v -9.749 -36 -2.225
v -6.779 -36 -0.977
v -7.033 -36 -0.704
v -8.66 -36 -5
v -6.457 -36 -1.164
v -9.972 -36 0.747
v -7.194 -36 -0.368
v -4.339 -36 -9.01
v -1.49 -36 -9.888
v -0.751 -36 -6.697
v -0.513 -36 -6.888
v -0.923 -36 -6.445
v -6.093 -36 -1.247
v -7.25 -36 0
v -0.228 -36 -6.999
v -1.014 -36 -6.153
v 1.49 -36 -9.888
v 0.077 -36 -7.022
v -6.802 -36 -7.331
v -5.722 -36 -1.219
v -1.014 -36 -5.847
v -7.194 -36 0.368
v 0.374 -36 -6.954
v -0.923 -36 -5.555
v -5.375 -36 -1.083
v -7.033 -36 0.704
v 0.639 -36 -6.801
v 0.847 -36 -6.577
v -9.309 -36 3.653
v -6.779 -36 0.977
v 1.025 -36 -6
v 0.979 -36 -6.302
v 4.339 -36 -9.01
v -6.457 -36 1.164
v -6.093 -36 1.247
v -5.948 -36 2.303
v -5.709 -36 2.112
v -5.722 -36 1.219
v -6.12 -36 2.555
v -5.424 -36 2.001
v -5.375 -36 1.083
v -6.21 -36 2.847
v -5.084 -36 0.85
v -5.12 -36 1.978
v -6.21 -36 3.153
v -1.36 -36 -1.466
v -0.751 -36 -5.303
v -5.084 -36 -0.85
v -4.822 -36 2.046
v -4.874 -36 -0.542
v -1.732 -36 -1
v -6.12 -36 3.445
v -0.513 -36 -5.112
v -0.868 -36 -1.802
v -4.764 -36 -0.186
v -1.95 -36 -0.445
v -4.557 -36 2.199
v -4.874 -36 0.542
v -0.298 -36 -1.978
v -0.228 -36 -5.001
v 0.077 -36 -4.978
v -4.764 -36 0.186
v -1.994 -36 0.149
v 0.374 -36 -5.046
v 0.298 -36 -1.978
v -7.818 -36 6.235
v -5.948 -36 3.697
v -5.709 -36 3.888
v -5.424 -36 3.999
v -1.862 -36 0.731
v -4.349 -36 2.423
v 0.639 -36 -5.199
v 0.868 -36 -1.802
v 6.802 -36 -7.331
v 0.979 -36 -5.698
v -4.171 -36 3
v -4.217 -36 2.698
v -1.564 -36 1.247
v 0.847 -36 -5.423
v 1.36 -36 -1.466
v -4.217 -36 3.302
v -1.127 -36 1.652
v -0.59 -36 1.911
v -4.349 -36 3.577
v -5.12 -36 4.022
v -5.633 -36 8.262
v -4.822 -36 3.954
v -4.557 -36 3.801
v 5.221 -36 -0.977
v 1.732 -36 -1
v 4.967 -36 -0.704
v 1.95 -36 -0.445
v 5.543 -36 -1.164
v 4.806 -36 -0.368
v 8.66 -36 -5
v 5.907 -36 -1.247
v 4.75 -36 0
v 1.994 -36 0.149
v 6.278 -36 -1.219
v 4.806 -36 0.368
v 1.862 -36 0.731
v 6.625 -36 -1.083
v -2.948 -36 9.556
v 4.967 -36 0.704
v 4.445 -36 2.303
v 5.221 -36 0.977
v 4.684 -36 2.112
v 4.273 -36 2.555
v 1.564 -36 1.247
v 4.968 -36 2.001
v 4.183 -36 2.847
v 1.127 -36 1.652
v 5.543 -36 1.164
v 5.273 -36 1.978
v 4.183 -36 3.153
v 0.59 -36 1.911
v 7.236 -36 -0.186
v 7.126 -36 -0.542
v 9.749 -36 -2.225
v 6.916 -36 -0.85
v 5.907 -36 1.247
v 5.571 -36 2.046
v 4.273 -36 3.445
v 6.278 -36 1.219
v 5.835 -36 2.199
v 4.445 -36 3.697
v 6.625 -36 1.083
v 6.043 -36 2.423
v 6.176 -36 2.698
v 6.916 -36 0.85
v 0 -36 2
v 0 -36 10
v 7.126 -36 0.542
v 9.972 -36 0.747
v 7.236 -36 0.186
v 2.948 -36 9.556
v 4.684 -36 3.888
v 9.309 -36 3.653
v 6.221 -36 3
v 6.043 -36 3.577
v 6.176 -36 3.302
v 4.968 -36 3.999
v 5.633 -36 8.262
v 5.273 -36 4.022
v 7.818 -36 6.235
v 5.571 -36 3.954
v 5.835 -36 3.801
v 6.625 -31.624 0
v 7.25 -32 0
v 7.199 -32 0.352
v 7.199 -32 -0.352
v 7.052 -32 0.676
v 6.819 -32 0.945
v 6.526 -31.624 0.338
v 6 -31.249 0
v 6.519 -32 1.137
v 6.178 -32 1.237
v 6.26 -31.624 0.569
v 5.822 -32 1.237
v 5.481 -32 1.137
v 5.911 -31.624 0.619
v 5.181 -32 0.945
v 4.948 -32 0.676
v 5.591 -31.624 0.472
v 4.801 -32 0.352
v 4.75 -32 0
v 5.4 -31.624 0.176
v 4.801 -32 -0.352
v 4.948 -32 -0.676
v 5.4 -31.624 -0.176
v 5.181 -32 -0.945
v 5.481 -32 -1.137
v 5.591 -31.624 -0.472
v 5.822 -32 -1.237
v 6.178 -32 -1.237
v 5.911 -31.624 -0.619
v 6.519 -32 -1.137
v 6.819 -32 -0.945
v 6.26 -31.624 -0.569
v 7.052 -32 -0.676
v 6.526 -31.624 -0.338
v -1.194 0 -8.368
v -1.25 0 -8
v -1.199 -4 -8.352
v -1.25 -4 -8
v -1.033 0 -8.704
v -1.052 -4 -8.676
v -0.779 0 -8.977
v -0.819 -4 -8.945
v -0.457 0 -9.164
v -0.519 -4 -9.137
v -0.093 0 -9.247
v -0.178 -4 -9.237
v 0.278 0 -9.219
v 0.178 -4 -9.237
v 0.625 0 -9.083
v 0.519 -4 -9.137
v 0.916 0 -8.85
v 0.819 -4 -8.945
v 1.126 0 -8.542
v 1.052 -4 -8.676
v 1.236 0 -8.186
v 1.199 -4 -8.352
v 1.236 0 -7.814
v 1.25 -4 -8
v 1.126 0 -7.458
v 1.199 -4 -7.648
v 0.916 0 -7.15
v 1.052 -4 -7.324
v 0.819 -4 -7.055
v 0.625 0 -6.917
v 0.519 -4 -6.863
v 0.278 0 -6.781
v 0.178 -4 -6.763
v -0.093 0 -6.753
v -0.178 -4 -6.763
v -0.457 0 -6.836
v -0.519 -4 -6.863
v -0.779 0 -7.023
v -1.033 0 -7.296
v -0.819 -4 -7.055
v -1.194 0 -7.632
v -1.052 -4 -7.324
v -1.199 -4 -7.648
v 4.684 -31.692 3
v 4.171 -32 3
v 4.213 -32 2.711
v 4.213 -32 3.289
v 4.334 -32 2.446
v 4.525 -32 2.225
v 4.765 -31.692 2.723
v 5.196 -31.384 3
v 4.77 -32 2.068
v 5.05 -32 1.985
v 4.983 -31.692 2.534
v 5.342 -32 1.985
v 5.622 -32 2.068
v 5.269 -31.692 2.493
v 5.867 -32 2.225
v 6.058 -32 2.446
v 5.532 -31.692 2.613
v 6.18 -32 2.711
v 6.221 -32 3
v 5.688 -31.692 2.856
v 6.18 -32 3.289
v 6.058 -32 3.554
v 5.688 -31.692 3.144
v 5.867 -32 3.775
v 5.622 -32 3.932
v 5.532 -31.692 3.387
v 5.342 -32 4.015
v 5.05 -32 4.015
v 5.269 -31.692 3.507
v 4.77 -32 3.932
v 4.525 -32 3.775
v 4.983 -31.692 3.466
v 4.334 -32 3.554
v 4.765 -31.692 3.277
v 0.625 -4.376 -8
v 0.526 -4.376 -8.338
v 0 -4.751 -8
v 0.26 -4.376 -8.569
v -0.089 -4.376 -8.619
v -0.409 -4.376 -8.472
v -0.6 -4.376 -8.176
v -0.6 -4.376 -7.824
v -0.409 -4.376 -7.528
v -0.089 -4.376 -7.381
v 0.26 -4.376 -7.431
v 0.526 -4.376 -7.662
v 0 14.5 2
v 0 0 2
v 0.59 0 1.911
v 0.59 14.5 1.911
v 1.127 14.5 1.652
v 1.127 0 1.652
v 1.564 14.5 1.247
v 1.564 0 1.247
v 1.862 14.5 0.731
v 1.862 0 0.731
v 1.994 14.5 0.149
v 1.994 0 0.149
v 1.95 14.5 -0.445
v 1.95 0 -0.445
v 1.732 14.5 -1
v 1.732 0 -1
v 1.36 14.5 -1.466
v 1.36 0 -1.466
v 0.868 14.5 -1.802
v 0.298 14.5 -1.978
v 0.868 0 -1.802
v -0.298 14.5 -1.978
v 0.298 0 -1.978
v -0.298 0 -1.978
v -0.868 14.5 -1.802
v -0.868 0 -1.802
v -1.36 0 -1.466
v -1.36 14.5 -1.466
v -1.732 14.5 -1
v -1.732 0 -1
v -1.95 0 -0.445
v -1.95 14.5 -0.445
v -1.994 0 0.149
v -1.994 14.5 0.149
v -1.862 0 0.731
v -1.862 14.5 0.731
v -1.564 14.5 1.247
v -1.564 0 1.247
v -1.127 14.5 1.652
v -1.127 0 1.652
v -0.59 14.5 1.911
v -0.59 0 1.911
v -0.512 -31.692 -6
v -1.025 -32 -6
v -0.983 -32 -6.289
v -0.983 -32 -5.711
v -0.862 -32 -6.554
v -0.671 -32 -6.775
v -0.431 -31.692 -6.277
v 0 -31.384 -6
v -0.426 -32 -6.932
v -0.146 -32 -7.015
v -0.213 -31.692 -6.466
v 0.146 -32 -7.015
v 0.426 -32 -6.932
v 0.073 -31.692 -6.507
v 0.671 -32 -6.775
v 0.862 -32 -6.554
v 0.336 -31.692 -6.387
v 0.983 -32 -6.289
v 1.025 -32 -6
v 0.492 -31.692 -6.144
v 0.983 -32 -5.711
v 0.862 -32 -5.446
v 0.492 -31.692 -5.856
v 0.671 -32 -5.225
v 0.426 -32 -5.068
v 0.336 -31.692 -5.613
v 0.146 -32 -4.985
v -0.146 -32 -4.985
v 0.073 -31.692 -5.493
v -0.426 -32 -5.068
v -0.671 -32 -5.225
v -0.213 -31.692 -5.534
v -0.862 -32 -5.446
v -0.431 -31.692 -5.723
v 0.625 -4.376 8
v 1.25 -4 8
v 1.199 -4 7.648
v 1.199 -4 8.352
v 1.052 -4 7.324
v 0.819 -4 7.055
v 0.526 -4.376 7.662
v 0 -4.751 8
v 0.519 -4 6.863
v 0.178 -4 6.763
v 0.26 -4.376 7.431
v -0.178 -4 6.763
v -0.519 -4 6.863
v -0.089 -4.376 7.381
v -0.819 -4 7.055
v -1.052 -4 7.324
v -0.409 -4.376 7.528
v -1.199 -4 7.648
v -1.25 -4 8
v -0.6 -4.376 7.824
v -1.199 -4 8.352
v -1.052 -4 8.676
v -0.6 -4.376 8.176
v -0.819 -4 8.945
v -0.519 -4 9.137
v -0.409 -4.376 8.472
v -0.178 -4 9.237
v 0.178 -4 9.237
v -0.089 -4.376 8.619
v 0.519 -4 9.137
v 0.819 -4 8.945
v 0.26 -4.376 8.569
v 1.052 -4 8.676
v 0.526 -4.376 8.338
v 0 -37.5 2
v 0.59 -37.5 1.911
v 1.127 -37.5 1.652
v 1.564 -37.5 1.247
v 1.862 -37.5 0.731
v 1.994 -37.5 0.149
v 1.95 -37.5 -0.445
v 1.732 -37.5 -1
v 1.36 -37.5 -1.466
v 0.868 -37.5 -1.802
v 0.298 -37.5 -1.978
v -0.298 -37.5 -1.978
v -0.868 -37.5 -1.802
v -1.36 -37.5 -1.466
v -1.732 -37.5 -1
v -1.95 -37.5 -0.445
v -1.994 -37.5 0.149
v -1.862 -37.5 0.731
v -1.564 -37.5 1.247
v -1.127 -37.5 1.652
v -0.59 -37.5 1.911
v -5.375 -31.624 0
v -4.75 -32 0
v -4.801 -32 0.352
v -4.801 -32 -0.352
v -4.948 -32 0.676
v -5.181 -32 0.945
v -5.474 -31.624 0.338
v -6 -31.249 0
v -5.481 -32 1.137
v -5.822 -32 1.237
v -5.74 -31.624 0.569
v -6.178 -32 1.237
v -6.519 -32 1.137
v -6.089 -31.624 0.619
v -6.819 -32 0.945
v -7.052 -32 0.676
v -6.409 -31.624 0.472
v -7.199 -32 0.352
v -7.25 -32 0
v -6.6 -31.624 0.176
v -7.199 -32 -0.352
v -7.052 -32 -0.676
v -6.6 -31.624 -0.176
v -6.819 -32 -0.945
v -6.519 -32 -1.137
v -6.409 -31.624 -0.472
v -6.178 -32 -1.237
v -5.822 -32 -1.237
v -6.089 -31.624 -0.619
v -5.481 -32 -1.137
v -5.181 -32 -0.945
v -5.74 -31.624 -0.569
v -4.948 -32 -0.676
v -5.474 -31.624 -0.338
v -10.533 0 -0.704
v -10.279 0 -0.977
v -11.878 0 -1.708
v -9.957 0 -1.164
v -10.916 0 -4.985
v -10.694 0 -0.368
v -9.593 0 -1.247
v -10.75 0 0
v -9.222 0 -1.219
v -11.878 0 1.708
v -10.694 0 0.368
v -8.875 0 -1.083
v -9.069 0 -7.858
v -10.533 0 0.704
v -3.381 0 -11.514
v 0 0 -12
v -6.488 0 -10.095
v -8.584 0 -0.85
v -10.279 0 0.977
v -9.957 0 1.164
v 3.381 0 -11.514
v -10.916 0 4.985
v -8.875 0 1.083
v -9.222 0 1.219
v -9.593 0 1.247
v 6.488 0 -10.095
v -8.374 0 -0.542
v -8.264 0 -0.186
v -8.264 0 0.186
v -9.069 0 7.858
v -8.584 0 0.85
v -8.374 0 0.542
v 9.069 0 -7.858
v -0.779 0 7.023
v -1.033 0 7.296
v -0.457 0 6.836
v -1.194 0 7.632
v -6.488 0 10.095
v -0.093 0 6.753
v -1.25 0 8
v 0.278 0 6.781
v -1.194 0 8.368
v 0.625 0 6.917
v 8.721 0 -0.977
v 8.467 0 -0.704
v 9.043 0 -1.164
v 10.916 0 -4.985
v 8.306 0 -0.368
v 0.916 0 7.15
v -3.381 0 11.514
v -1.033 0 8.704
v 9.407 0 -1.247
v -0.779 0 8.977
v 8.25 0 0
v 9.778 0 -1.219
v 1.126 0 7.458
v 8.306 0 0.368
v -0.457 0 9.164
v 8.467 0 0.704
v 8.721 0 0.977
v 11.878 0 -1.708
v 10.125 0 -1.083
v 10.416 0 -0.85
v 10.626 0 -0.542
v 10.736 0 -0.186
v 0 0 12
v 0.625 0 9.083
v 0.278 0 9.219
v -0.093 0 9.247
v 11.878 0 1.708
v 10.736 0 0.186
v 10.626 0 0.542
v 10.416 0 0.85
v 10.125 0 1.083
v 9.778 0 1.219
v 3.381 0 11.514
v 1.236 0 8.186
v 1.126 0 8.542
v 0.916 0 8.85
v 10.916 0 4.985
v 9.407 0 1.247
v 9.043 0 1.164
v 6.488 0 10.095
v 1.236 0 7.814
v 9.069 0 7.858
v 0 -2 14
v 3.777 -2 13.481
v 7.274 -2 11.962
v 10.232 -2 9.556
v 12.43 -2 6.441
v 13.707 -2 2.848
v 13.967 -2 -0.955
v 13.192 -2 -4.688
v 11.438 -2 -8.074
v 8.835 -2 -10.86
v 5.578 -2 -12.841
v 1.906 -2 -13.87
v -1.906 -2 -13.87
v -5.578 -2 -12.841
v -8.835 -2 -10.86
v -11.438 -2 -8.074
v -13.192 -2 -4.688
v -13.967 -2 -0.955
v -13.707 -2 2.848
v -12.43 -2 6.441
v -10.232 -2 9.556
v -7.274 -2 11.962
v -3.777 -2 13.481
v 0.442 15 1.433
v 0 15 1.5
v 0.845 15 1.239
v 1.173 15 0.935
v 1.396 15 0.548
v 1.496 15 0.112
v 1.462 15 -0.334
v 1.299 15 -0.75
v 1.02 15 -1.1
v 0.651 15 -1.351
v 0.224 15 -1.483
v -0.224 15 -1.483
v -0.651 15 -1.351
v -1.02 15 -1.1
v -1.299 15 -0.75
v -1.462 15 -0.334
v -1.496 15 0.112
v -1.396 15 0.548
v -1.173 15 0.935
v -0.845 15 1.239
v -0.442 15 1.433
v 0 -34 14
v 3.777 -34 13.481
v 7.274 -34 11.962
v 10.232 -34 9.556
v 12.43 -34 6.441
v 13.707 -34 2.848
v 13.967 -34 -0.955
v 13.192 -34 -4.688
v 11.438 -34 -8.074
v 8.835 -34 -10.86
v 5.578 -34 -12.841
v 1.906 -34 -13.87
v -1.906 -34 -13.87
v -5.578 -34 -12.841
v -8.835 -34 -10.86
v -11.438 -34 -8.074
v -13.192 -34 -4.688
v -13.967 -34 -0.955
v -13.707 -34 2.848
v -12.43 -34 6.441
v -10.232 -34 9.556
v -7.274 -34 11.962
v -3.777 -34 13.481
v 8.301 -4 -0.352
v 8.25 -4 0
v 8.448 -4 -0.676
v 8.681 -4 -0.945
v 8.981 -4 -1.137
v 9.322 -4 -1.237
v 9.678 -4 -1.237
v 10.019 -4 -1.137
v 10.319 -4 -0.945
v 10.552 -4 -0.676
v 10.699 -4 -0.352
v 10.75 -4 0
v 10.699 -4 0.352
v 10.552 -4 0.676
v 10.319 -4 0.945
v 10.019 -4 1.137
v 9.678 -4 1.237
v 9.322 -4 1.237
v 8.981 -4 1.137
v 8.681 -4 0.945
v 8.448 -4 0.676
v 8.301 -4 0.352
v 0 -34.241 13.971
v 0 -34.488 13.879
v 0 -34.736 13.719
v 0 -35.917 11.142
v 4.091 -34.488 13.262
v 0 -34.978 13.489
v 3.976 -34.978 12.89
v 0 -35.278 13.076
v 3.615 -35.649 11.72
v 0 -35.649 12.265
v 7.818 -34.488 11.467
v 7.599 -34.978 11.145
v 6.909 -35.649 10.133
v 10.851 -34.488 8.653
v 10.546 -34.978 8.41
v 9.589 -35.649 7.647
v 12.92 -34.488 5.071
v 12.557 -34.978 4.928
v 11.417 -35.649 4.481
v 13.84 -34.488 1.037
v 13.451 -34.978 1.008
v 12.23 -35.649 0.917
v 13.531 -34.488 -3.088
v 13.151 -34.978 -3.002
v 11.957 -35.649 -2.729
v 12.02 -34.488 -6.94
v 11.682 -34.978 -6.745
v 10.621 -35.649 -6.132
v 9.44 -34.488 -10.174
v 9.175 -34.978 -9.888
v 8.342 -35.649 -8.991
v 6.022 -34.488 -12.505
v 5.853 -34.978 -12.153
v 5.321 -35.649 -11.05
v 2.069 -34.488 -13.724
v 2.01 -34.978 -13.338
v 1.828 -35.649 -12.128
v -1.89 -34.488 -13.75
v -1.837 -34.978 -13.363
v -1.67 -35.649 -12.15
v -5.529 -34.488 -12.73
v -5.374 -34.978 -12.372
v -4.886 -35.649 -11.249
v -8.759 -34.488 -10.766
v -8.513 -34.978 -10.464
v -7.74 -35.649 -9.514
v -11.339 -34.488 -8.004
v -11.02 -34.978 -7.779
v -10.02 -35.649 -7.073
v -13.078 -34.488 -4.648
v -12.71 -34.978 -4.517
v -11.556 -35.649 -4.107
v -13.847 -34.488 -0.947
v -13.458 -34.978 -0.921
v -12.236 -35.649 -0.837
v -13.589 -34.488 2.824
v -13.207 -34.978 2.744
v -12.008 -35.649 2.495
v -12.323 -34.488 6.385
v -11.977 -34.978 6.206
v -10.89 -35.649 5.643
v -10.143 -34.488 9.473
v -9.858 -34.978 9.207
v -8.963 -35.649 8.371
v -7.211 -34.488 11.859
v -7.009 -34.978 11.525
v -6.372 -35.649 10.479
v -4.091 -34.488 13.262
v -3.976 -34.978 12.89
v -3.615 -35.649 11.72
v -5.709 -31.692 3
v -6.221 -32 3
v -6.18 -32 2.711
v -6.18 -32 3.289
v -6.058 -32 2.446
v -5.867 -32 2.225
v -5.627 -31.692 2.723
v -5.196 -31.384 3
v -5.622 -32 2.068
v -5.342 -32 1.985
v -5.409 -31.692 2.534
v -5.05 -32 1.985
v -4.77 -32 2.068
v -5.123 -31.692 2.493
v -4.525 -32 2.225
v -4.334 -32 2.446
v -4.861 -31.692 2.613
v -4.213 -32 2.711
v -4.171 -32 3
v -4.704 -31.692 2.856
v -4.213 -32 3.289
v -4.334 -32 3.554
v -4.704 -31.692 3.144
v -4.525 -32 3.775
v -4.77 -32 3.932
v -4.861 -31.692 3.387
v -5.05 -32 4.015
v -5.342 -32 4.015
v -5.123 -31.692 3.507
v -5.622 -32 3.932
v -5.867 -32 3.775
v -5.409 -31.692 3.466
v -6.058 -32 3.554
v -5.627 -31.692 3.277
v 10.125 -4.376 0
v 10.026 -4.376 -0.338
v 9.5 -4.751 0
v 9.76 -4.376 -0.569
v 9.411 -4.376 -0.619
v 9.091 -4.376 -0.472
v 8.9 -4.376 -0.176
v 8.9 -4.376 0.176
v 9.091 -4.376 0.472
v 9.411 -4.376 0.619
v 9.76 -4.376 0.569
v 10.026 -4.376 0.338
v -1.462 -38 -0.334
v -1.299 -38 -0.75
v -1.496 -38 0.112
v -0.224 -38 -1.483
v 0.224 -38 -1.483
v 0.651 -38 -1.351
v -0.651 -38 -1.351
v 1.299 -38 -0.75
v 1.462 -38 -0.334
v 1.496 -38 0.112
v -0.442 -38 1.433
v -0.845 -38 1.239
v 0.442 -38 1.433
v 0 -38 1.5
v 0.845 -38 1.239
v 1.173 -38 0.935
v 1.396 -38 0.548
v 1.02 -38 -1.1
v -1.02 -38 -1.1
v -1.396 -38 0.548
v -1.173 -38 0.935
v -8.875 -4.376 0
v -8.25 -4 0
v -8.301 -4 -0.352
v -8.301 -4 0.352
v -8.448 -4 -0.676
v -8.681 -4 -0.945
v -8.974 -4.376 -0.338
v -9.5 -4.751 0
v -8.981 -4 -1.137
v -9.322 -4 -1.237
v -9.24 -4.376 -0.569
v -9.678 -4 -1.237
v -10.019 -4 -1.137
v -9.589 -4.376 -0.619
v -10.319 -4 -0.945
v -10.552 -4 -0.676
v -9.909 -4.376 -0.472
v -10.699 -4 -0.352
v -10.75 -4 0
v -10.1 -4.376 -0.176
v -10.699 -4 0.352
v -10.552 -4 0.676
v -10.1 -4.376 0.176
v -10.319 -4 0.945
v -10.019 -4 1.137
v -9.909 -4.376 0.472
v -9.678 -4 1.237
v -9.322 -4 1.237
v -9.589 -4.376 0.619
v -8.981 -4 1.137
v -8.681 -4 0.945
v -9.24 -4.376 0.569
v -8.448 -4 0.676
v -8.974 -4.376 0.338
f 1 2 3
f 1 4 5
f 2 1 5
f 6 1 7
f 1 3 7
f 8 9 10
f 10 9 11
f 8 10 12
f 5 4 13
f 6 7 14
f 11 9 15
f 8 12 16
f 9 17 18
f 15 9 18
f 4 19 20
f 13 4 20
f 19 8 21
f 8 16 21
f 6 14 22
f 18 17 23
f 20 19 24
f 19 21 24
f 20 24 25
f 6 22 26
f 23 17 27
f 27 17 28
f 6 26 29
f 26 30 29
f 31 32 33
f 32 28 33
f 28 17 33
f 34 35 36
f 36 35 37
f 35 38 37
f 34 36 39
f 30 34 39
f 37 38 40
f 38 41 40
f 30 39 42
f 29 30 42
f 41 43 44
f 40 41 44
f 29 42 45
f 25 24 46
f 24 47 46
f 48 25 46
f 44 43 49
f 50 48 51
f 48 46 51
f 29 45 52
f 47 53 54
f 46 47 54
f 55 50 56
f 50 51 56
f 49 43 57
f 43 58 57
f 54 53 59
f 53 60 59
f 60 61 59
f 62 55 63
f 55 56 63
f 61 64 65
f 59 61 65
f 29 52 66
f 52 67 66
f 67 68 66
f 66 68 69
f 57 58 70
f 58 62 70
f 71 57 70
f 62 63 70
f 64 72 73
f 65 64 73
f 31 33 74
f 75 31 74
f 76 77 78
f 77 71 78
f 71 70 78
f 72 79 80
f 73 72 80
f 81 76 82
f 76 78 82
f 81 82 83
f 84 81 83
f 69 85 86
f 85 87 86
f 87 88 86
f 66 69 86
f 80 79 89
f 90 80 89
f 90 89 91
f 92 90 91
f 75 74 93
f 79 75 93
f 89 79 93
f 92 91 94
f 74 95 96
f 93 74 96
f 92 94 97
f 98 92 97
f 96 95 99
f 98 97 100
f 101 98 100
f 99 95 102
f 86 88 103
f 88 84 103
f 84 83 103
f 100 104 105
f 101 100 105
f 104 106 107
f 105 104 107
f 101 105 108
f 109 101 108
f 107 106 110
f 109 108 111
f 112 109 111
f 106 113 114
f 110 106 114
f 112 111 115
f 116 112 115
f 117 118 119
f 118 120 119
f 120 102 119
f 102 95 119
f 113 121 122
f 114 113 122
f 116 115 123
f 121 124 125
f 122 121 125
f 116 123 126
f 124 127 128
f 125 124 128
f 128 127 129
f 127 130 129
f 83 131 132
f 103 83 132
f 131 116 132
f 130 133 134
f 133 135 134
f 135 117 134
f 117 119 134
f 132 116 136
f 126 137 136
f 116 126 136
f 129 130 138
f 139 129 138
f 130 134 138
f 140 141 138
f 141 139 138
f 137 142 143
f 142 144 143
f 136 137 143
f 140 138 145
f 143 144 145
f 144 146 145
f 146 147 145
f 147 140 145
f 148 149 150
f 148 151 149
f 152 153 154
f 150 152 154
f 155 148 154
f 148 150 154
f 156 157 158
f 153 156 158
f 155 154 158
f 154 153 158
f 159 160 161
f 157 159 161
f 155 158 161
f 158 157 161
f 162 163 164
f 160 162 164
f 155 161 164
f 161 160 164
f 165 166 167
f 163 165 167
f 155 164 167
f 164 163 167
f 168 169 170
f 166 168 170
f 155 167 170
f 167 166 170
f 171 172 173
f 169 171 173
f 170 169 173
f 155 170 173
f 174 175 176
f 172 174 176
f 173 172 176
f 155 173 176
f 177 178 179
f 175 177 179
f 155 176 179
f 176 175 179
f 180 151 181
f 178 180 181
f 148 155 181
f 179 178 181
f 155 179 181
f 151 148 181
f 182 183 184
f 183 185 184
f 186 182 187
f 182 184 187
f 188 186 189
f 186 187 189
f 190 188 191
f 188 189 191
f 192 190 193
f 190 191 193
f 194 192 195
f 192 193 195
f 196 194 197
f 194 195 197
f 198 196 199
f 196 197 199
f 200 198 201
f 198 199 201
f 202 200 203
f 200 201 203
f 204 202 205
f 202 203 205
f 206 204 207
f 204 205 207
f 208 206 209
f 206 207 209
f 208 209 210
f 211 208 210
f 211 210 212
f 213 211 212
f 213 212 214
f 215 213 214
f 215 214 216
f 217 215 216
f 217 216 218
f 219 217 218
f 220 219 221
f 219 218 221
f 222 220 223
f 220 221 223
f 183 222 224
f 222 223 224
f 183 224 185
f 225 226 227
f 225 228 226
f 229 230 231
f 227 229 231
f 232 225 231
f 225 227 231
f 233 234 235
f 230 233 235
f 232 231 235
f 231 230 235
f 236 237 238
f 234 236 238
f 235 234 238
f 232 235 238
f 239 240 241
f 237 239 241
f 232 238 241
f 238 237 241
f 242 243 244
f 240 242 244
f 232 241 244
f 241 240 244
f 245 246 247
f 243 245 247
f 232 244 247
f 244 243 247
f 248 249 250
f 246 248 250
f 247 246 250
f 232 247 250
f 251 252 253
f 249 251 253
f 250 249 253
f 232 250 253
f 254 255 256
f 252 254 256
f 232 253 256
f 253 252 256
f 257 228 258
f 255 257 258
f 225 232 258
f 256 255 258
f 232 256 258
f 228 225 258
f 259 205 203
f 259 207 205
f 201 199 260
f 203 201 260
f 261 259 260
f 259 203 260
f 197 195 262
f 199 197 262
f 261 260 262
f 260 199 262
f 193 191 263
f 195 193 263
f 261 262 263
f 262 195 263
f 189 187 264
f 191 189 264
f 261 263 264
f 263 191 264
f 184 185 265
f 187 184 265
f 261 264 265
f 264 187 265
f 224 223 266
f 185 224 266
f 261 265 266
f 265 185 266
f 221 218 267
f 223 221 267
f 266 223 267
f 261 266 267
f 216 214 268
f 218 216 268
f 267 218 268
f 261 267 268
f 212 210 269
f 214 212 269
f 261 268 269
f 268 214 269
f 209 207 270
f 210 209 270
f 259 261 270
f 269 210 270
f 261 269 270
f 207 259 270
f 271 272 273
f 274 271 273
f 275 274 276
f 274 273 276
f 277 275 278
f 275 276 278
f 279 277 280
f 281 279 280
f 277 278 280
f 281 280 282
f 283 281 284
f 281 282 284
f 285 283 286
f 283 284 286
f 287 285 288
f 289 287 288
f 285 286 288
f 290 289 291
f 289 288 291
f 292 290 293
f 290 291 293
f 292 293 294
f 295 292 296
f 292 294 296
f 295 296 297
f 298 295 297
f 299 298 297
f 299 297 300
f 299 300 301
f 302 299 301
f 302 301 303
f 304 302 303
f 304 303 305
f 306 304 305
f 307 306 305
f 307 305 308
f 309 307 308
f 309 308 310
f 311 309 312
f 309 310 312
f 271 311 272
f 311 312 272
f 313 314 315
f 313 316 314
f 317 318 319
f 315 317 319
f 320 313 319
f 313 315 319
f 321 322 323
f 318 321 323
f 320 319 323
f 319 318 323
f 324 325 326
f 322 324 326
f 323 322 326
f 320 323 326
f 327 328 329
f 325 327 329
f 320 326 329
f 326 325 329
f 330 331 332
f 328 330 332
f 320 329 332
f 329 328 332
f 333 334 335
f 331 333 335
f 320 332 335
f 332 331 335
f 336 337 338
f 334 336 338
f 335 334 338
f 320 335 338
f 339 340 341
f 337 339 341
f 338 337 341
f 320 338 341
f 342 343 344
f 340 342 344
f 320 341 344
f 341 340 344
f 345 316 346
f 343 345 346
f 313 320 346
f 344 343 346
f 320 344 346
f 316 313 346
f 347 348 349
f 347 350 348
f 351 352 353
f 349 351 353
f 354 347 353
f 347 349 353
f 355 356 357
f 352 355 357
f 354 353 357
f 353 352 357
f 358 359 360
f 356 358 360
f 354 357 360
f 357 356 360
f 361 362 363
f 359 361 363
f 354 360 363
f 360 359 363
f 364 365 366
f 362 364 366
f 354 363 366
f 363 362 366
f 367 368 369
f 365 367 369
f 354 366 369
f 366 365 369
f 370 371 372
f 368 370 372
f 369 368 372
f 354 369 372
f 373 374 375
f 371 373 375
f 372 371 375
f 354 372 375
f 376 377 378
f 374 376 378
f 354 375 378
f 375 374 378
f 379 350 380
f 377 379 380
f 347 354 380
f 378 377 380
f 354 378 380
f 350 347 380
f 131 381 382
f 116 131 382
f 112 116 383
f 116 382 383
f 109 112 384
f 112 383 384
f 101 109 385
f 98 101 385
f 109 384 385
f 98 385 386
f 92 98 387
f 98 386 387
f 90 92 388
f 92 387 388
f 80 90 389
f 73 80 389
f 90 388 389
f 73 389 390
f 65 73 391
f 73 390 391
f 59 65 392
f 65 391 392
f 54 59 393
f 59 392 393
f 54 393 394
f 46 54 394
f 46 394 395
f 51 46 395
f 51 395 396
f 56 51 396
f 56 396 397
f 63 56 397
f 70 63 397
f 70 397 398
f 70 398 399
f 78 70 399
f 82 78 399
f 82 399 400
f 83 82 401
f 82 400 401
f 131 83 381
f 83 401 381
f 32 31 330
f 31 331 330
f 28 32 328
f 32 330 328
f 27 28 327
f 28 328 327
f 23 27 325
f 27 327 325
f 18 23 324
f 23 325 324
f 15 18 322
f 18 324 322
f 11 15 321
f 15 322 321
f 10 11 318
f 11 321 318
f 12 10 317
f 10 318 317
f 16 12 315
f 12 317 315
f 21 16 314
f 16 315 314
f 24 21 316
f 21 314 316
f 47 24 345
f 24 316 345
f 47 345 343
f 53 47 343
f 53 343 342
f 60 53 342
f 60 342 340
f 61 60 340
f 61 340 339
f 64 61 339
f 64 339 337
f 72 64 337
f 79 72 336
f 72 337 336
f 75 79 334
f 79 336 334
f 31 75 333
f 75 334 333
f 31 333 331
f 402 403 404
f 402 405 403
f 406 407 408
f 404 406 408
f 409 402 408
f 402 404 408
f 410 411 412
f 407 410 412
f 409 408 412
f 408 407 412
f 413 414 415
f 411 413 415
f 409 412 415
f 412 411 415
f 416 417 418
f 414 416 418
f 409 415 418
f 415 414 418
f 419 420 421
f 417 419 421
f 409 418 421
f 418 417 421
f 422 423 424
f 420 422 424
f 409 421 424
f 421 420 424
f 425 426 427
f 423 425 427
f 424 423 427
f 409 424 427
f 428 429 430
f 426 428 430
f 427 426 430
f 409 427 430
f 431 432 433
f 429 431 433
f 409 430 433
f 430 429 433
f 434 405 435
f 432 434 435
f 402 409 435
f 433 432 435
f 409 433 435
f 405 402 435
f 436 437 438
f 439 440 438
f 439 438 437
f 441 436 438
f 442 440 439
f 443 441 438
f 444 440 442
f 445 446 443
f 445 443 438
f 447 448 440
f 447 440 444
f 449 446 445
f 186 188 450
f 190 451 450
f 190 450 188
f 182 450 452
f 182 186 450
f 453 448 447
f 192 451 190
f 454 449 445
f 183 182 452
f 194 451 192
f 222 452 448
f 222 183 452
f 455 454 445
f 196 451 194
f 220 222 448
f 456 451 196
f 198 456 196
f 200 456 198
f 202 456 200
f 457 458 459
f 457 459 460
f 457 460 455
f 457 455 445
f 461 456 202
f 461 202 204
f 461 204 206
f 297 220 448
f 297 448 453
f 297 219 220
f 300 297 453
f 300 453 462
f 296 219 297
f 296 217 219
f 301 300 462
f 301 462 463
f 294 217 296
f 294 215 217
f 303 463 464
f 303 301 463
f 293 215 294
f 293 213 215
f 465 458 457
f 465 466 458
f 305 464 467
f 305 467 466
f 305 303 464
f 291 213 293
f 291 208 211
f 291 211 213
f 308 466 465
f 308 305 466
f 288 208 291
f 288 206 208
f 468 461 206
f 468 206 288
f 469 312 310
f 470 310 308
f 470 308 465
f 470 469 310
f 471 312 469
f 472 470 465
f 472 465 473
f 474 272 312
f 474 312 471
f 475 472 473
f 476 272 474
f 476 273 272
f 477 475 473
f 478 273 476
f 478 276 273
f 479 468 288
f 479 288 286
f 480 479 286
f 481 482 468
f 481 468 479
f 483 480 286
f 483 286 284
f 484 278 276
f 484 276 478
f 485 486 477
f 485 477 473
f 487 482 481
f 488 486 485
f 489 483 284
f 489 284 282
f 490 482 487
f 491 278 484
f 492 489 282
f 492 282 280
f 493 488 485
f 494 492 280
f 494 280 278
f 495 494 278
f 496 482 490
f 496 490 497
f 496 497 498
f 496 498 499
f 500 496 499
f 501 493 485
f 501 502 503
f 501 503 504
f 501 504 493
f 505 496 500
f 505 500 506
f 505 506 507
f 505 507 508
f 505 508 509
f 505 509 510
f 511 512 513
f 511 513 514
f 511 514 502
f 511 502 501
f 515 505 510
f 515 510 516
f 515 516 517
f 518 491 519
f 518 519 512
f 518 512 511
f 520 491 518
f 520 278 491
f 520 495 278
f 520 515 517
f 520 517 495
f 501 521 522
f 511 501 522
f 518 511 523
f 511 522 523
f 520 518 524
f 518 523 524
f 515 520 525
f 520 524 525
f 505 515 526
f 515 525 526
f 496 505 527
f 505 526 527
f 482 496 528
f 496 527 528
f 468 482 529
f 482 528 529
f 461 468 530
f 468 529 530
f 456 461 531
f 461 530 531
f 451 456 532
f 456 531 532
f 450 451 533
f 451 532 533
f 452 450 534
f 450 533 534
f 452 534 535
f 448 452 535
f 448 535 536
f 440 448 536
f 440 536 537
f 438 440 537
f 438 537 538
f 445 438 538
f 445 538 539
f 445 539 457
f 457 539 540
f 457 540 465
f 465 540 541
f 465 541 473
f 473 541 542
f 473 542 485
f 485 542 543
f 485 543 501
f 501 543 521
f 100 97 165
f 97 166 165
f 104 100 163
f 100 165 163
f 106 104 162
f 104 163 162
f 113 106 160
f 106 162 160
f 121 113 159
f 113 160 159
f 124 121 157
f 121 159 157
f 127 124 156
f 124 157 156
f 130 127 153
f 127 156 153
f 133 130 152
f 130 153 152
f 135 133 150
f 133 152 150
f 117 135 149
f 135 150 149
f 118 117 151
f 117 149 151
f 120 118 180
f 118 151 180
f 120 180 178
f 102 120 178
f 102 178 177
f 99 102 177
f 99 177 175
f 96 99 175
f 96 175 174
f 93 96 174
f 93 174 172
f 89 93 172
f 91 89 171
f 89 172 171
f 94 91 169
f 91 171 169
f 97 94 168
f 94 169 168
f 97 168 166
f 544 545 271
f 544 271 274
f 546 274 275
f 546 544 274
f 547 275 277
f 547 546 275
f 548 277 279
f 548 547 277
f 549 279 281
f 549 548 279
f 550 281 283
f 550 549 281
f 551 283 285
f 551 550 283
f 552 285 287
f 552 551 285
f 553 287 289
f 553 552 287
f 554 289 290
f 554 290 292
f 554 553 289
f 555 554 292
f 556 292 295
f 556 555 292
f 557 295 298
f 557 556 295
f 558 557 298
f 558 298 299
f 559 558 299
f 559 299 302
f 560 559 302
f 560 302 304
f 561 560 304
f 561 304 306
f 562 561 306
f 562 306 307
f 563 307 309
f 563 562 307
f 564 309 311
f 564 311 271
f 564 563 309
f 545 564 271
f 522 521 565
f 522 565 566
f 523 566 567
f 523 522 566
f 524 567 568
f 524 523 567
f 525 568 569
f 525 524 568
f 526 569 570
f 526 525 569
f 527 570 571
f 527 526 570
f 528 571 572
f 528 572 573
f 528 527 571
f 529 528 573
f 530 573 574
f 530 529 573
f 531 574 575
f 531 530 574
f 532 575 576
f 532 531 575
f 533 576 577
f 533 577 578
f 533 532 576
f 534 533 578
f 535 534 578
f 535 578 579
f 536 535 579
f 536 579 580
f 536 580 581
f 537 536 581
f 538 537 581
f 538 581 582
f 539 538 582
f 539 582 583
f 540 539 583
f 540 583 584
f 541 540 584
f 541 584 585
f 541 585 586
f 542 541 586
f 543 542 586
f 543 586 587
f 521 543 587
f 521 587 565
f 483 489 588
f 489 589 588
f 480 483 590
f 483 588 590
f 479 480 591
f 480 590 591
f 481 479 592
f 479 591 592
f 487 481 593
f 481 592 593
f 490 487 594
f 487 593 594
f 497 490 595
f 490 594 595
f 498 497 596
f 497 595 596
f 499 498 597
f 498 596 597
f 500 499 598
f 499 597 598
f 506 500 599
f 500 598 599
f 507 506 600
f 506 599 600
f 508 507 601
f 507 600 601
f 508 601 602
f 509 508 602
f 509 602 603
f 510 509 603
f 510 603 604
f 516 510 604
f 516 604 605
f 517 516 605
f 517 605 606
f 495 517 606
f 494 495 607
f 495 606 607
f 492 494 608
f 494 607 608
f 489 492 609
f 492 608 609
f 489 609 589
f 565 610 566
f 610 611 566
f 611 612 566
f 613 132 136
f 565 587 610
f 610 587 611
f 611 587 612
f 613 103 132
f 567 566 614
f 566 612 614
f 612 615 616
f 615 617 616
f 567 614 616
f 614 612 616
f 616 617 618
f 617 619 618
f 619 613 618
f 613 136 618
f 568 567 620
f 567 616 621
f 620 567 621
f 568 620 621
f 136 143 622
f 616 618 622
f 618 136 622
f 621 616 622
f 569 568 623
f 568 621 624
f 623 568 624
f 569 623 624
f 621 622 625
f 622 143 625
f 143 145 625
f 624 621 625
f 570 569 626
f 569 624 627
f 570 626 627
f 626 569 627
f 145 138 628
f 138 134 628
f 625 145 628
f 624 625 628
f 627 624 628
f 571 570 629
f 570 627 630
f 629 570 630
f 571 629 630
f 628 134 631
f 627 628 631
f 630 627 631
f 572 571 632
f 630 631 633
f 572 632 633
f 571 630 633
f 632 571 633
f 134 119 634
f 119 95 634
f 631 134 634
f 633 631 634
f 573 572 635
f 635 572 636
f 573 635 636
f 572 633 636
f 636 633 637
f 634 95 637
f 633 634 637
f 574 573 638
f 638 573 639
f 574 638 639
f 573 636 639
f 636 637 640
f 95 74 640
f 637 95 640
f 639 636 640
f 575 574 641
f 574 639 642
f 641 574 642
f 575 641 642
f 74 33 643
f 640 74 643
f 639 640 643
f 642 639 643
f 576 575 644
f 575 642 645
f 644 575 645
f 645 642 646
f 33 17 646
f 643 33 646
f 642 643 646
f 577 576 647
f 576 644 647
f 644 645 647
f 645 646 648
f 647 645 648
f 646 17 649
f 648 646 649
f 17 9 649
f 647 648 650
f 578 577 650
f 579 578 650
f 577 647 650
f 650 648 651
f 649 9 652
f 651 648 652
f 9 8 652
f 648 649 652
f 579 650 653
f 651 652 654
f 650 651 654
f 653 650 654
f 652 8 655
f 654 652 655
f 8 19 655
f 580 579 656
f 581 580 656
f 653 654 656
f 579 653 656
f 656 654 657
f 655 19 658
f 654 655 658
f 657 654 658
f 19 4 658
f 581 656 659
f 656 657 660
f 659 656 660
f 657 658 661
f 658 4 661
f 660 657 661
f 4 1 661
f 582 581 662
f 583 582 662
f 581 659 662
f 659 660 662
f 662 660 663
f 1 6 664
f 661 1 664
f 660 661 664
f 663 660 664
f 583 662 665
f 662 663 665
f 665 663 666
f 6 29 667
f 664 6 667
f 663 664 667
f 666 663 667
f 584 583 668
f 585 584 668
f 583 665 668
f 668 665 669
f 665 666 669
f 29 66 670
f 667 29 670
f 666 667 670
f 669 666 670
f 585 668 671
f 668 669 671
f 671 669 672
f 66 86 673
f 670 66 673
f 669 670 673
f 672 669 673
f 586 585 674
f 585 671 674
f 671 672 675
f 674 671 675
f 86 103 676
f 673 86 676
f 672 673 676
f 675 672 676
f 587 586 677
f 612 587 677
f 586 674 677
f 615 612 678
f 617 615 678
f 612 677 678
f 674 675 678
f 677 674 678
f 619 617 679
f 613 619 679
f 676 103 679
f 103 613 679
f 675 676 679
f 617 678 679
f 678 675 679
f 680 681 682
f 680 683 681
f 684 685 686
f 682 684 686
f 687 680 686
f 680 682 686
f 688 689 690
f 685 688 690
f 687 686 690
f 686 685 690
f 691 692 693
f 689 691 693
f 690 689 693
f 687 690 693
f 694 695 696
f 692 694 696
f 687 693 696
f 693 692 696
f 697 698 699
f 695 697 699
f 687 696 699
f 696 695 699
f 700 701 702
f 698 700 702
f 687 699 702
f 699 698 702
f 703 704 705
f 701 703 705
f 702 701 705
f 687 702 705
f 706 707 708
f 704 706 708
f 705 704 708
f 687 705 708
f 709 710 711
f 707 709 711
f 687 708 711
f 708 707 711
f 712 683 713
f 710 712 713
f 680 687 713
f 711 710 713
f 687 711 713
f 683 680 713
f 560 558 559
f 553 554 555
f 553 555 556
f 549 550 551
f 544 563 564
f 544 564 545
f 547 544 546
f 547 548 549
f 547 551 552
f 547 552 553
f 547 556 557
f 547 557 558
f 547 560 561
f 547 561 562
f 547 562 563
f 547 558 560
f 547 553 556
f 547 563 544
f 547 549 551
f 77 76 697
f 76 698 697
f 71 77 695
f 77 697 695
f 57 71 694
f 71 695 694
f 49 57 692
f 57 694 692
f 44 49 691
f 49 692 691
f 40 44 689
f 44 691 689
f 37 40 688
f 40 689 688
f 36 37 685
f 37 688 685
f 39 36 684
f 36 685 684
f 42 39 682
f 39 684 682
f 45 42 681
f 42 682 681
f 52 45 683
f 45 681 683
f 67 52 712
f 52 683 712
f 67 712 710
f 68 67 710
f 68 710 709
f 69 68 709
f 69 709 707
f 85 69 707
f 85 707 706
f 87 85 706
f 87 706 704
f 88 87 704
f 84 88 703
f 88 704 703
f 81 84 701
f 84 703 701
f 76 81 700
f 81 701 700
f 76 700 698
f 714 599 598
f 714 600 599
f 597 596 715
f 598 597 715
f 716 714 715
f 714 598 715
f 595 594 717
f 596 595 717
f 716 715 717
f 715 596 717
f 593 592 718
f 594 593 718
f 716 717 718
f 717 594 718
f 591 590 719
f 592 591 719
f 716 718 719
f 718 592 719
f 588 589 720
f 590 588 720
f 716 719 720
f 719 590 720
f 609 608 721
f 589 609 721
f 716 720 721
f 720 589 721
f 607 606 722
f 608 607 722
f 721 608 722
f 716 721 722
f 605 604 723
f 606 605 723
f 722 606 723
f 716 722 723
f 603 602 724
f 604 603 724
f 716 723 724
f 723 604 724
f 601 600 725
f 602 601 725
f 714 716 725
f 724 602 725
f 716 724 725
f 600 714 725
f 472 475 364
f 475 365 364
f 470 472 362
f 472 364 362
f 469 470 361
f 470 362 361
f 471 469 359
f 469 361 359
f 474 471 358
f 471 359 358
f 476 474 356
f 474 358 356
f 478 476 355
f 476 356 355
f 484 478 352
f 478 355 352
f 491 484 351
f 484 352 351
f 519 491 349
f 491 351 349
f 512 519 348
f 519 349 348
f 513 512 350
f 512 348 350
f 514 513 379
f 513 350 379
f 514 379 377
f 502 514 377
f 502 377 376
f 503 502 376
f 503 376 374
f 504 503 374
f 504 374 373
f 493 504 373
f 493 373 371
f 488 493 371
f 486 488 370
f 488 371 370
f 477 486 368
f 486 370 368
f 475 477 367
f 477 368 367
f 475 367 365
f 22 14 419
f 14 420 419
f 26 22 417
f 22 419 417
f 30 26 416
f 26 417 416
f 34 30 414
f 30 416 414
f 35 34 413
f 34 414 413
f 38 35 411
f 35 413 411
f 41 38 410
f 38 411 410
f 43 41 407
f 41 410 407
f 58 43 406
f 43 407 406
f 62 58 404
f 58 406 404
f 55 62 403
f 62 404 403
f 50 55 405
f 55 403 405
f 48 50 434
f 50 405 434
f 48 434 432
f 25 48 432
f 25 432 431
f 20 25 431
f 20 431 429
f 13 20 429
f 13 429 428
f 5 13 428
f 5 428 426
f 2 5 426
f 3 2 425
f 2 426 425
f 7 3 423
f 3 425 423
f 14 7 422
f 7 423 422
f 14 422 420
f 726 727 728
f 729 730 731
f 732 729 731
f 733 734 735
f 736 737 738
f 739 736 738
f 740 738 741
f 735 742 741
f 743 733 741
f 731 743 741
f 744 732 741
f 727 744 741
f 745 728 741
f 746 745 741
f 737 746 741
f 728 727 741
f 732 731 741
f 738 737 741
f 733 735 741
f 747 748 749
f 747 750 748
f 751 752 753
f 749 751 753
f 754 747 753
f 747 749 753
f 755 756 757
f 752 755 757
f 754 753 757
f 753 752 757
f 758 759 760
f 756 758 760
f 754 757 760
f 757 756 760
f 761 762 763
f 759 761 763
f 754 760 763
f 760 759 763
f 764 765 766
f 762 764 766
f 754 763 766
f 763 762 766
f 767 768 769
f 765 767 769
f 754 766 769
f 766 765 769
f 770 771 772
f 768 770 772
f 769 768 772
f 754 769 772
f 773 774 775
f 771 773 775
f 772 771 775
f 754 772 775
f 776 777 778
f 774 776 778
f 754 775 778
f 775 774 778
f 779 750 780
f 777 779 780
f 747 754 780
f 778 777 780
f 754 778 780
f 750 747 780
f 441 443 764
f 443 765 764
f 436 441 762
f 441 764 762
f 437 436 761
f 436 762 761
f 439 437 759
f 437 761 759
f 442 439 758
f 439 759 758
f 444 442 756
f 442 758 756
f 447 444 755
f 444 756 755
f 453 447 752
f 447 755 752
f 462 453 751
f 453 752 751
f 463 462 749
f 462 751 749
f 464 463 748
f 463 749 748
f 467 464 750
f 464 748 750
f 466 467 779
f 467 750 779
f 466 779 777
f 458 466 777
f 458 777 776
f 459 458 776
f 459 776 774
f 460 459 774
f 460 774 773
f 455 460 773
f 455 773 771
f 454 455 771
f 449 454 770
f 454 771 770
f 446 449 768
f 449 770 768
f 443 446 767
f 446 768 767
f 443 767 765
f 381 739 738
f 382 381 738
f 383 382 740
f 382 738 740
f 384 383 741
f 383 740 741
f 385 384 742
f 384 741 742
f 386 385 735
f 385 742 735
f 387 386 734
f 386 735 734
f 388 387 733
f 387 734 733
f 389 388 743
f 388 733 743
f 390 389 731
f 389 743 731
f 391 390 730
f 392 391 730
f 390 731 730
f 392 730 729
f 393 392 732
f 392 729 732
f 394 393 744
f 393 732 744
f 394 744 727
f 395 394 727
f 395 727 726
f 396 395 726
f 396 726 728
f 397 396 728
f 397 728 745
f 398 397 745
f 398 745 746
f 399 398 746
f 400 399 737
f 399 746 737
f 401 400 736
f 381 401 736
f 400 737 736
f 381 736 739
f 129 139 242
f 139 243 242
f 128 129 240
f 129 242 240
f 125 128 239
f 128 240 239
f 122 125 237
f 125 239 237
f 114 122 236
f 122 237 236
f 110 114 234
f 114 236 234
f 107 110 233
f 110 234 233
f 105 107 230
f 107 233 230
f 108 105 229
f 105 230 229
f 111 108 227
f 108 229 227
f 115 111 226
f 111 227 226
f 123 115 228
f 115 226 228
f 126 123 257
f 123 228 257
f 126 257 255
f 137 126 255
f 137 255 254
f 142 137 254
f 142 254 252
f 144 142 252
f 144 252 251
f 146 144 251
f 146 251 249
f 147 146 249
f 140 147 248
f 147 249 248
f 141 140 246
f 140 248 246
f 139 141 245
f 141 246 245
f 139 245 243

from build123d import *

# Parameters (mm, degrees)
SKETCH1_R                    = 14
BOSS_EXTRUDE1_DEPTH          = 36
SKETCH1_3_R                  = 2
BOSS_EXTRUDE2_DEPTH          = 15
BOSS_EXTRUDE3_START          = -38
SKETCH1_4_R                  = 2
BOSS_EXTRUDE3_DEPTH          = 2
CHAMFER1_SIZE                = 0.5
CHAMFER2_SIZE                = 2
FILLET1_SIZE                 = 2
FILLET1_SIZE_2               = 4
M3X0_5_TAPPED_HOLE2_D        = 2.5
M3X0_5_TAPPED_HOLE2_DEPTH    = 4
M3X0_5_TAPPED_HOLE2_TIP      = 0.751075774
M3X0_5_TAPPED_HOLE3_D        = 2.5
M3X0_5_TAPPED_HOLE3_DEPTH    = 4
M3X0_5_TAPPED_HOLE3_TIP      = 0.751075774
M2_5X0_45_TAPPED_HOLE1_D     = 2.05
M2_5X0_45_TAPPED_HOLE1_DEPTH = 4
M2_5X0_45_TAPPED_HOLE1_TIP   = 0.615882135


with BuildPart() as part:
    # Sketch1 → Boss-Extrude1 (new body)
    with BuildSketch(Plane(origin=(0, 0, 0), x_dir=(1, 0, 0), z_dir=(0, 1, 0))):
        with Locations(Location((0, 0, 0), (0, 0, 270))):
            Circle(SKETCH1_R)
    extrude(amount=-BOSS_EXTRUDE1_DEPTH)

    # Sketch1<3> → Boss-Extrude2 (add)
    with BuildSketch(Plane(origin=(0, 0, 0), x_dir=(1, 0, 0), z_dir=(0, 1, 0))):
        with Locations(Location((0, 0, 0), (0, 0, 270))):
            Circle(SKETCH1_3_R)
    extrude(amount=BOSS_EXTRUDE2_DEPTH)

    # Sketch1<4> → Boss-Extrude3 (add)
    with BuildSketch(Plane(origin=(0, 0, 0), x_dir=(1, 0, 0), z_dir=(0, 1, 0)).offset(BOSS_EXTRUDE3_START)):
        with Locations(Location((0, 0, 0), (0, 0, 270))):
            Circle(SKETCH1_4_R)
    extrude(amount=BOSS_EXTRUDE3_DEPTH)

    # Chamfer1
    chamfer1_edges = [part.edges().sort_by_distance(p)[0] for p in [
        (0, -38, -2),
        (0, 15, -2),
    ]]
    chamfer(chamfer1_edges, length=CHAMFER1_SIZE)

    # Chamfer2
    chamfer2_edges = [part.edges().sort_by_distance(p)[0] for p in [
        (0, 0, -14),
    ]]
    chamfer(chamfer2_edges, length=CHAMFER2_SIZE)

    # Fillet1
    # an asymmetric fillet: 4, 2 mm, written as the material it takes off along each edge
    with BuildSketch(Plane(origin=(0, -36, 0), x_dir=(0, 0, 1), z_dir=(-1, 0, 0))) as fillet1_piece_1:
        with BuildLine():
            Bezier((14, FILLET1_SIZE), (14, 0), (14 - FILLET1_SIZE_2, 0), weights=[1, 0.707106781, 1])
            Line((14 - FILLET1_SIZE_2, 0), (14, 0))
            Line((14, 0), (14, FILLET1_SIZE))
        make_face()
    revolve(axis=Axis((0, -36, 0), (0, 1, 0)), mode=Mode.SUBTRACT)

    # M3x0.5 Tapped Hole2
    with Locations(Plane(origin=(0, 0, 0), x_dir=(1, 0, 0), z_dir=(0, 1, 0))):
        with Locations((9.5, 0), (0, 8), (0, -8), (-9.5, 0)):
            Hole(M3X0_5_TAPPED_HOLE2_D / 2, depth=M3X0_5_TAPPED_HOLE2_DEPTH)
            with Locations((0, 0, -(M3X0_5_TAPPED_HOLE2_DEPTH + M3X0_5_TAPPED_HOLE2_TIP / 2))):  # 118° drill point
                Cone(0, M3X0_5_TAPPED_HOLE2_D / 2, M3X0_5_TAPPED_HOLE2_TIP, mode=Mode.SUBTRACT)

    # M3x0.5 Tapped Hole3
    with Locations(Plane.XZ.offset(36)):
        with Locations((6, 0), (-6, 0)):
            Hole(M3X0_5_TAPPED_HOLE3_D / 2, depth=M3X0_5_TAPPED_HOLE3_DEPTH)
            with Locations((0, 0, -(M3X0_5_TAPPED_HOLE3_DEPTH + M3X0_5_TAPPED_HOLE3_TIP / 2))):  # 118° drill point
                Cone(0, M3X0_5_TAPPED_HOLE3_D / 2, M3X0_5_TAPPED_HOLE3_TIP, mode=Mode.SUBTRACT)

    # M2.5x0.45 Tapped Hole1
    with Locations(Plane(origin=(0, -36, 0), x_dir=(-1, 0, 0), z_dir=(0, -1, 0))):
        with Locations((0, 6), (5.196152423, -3), (-5.196152423, -3)):
            Hole(M2_5X0_45_TAPPED_HOLE1_D / 2, depth=M2_5X0_45_TAPPED_HOLE1_DEPTH)
            with Locations((0, 0, -(M2_5X0_45_TAPPED_HOLE1_DEPTH + M2_5X0_45_TAPPED_HOLE1_TIP / 2))):  # 118° drill point
                Cone(0, M2_5X0_45_TAPPED_HOLE1_D / 2, M2_5X0_45_TAPPED_HOLE1_TIP, mode=Mode.SUBTRACT)


solid = part.part
